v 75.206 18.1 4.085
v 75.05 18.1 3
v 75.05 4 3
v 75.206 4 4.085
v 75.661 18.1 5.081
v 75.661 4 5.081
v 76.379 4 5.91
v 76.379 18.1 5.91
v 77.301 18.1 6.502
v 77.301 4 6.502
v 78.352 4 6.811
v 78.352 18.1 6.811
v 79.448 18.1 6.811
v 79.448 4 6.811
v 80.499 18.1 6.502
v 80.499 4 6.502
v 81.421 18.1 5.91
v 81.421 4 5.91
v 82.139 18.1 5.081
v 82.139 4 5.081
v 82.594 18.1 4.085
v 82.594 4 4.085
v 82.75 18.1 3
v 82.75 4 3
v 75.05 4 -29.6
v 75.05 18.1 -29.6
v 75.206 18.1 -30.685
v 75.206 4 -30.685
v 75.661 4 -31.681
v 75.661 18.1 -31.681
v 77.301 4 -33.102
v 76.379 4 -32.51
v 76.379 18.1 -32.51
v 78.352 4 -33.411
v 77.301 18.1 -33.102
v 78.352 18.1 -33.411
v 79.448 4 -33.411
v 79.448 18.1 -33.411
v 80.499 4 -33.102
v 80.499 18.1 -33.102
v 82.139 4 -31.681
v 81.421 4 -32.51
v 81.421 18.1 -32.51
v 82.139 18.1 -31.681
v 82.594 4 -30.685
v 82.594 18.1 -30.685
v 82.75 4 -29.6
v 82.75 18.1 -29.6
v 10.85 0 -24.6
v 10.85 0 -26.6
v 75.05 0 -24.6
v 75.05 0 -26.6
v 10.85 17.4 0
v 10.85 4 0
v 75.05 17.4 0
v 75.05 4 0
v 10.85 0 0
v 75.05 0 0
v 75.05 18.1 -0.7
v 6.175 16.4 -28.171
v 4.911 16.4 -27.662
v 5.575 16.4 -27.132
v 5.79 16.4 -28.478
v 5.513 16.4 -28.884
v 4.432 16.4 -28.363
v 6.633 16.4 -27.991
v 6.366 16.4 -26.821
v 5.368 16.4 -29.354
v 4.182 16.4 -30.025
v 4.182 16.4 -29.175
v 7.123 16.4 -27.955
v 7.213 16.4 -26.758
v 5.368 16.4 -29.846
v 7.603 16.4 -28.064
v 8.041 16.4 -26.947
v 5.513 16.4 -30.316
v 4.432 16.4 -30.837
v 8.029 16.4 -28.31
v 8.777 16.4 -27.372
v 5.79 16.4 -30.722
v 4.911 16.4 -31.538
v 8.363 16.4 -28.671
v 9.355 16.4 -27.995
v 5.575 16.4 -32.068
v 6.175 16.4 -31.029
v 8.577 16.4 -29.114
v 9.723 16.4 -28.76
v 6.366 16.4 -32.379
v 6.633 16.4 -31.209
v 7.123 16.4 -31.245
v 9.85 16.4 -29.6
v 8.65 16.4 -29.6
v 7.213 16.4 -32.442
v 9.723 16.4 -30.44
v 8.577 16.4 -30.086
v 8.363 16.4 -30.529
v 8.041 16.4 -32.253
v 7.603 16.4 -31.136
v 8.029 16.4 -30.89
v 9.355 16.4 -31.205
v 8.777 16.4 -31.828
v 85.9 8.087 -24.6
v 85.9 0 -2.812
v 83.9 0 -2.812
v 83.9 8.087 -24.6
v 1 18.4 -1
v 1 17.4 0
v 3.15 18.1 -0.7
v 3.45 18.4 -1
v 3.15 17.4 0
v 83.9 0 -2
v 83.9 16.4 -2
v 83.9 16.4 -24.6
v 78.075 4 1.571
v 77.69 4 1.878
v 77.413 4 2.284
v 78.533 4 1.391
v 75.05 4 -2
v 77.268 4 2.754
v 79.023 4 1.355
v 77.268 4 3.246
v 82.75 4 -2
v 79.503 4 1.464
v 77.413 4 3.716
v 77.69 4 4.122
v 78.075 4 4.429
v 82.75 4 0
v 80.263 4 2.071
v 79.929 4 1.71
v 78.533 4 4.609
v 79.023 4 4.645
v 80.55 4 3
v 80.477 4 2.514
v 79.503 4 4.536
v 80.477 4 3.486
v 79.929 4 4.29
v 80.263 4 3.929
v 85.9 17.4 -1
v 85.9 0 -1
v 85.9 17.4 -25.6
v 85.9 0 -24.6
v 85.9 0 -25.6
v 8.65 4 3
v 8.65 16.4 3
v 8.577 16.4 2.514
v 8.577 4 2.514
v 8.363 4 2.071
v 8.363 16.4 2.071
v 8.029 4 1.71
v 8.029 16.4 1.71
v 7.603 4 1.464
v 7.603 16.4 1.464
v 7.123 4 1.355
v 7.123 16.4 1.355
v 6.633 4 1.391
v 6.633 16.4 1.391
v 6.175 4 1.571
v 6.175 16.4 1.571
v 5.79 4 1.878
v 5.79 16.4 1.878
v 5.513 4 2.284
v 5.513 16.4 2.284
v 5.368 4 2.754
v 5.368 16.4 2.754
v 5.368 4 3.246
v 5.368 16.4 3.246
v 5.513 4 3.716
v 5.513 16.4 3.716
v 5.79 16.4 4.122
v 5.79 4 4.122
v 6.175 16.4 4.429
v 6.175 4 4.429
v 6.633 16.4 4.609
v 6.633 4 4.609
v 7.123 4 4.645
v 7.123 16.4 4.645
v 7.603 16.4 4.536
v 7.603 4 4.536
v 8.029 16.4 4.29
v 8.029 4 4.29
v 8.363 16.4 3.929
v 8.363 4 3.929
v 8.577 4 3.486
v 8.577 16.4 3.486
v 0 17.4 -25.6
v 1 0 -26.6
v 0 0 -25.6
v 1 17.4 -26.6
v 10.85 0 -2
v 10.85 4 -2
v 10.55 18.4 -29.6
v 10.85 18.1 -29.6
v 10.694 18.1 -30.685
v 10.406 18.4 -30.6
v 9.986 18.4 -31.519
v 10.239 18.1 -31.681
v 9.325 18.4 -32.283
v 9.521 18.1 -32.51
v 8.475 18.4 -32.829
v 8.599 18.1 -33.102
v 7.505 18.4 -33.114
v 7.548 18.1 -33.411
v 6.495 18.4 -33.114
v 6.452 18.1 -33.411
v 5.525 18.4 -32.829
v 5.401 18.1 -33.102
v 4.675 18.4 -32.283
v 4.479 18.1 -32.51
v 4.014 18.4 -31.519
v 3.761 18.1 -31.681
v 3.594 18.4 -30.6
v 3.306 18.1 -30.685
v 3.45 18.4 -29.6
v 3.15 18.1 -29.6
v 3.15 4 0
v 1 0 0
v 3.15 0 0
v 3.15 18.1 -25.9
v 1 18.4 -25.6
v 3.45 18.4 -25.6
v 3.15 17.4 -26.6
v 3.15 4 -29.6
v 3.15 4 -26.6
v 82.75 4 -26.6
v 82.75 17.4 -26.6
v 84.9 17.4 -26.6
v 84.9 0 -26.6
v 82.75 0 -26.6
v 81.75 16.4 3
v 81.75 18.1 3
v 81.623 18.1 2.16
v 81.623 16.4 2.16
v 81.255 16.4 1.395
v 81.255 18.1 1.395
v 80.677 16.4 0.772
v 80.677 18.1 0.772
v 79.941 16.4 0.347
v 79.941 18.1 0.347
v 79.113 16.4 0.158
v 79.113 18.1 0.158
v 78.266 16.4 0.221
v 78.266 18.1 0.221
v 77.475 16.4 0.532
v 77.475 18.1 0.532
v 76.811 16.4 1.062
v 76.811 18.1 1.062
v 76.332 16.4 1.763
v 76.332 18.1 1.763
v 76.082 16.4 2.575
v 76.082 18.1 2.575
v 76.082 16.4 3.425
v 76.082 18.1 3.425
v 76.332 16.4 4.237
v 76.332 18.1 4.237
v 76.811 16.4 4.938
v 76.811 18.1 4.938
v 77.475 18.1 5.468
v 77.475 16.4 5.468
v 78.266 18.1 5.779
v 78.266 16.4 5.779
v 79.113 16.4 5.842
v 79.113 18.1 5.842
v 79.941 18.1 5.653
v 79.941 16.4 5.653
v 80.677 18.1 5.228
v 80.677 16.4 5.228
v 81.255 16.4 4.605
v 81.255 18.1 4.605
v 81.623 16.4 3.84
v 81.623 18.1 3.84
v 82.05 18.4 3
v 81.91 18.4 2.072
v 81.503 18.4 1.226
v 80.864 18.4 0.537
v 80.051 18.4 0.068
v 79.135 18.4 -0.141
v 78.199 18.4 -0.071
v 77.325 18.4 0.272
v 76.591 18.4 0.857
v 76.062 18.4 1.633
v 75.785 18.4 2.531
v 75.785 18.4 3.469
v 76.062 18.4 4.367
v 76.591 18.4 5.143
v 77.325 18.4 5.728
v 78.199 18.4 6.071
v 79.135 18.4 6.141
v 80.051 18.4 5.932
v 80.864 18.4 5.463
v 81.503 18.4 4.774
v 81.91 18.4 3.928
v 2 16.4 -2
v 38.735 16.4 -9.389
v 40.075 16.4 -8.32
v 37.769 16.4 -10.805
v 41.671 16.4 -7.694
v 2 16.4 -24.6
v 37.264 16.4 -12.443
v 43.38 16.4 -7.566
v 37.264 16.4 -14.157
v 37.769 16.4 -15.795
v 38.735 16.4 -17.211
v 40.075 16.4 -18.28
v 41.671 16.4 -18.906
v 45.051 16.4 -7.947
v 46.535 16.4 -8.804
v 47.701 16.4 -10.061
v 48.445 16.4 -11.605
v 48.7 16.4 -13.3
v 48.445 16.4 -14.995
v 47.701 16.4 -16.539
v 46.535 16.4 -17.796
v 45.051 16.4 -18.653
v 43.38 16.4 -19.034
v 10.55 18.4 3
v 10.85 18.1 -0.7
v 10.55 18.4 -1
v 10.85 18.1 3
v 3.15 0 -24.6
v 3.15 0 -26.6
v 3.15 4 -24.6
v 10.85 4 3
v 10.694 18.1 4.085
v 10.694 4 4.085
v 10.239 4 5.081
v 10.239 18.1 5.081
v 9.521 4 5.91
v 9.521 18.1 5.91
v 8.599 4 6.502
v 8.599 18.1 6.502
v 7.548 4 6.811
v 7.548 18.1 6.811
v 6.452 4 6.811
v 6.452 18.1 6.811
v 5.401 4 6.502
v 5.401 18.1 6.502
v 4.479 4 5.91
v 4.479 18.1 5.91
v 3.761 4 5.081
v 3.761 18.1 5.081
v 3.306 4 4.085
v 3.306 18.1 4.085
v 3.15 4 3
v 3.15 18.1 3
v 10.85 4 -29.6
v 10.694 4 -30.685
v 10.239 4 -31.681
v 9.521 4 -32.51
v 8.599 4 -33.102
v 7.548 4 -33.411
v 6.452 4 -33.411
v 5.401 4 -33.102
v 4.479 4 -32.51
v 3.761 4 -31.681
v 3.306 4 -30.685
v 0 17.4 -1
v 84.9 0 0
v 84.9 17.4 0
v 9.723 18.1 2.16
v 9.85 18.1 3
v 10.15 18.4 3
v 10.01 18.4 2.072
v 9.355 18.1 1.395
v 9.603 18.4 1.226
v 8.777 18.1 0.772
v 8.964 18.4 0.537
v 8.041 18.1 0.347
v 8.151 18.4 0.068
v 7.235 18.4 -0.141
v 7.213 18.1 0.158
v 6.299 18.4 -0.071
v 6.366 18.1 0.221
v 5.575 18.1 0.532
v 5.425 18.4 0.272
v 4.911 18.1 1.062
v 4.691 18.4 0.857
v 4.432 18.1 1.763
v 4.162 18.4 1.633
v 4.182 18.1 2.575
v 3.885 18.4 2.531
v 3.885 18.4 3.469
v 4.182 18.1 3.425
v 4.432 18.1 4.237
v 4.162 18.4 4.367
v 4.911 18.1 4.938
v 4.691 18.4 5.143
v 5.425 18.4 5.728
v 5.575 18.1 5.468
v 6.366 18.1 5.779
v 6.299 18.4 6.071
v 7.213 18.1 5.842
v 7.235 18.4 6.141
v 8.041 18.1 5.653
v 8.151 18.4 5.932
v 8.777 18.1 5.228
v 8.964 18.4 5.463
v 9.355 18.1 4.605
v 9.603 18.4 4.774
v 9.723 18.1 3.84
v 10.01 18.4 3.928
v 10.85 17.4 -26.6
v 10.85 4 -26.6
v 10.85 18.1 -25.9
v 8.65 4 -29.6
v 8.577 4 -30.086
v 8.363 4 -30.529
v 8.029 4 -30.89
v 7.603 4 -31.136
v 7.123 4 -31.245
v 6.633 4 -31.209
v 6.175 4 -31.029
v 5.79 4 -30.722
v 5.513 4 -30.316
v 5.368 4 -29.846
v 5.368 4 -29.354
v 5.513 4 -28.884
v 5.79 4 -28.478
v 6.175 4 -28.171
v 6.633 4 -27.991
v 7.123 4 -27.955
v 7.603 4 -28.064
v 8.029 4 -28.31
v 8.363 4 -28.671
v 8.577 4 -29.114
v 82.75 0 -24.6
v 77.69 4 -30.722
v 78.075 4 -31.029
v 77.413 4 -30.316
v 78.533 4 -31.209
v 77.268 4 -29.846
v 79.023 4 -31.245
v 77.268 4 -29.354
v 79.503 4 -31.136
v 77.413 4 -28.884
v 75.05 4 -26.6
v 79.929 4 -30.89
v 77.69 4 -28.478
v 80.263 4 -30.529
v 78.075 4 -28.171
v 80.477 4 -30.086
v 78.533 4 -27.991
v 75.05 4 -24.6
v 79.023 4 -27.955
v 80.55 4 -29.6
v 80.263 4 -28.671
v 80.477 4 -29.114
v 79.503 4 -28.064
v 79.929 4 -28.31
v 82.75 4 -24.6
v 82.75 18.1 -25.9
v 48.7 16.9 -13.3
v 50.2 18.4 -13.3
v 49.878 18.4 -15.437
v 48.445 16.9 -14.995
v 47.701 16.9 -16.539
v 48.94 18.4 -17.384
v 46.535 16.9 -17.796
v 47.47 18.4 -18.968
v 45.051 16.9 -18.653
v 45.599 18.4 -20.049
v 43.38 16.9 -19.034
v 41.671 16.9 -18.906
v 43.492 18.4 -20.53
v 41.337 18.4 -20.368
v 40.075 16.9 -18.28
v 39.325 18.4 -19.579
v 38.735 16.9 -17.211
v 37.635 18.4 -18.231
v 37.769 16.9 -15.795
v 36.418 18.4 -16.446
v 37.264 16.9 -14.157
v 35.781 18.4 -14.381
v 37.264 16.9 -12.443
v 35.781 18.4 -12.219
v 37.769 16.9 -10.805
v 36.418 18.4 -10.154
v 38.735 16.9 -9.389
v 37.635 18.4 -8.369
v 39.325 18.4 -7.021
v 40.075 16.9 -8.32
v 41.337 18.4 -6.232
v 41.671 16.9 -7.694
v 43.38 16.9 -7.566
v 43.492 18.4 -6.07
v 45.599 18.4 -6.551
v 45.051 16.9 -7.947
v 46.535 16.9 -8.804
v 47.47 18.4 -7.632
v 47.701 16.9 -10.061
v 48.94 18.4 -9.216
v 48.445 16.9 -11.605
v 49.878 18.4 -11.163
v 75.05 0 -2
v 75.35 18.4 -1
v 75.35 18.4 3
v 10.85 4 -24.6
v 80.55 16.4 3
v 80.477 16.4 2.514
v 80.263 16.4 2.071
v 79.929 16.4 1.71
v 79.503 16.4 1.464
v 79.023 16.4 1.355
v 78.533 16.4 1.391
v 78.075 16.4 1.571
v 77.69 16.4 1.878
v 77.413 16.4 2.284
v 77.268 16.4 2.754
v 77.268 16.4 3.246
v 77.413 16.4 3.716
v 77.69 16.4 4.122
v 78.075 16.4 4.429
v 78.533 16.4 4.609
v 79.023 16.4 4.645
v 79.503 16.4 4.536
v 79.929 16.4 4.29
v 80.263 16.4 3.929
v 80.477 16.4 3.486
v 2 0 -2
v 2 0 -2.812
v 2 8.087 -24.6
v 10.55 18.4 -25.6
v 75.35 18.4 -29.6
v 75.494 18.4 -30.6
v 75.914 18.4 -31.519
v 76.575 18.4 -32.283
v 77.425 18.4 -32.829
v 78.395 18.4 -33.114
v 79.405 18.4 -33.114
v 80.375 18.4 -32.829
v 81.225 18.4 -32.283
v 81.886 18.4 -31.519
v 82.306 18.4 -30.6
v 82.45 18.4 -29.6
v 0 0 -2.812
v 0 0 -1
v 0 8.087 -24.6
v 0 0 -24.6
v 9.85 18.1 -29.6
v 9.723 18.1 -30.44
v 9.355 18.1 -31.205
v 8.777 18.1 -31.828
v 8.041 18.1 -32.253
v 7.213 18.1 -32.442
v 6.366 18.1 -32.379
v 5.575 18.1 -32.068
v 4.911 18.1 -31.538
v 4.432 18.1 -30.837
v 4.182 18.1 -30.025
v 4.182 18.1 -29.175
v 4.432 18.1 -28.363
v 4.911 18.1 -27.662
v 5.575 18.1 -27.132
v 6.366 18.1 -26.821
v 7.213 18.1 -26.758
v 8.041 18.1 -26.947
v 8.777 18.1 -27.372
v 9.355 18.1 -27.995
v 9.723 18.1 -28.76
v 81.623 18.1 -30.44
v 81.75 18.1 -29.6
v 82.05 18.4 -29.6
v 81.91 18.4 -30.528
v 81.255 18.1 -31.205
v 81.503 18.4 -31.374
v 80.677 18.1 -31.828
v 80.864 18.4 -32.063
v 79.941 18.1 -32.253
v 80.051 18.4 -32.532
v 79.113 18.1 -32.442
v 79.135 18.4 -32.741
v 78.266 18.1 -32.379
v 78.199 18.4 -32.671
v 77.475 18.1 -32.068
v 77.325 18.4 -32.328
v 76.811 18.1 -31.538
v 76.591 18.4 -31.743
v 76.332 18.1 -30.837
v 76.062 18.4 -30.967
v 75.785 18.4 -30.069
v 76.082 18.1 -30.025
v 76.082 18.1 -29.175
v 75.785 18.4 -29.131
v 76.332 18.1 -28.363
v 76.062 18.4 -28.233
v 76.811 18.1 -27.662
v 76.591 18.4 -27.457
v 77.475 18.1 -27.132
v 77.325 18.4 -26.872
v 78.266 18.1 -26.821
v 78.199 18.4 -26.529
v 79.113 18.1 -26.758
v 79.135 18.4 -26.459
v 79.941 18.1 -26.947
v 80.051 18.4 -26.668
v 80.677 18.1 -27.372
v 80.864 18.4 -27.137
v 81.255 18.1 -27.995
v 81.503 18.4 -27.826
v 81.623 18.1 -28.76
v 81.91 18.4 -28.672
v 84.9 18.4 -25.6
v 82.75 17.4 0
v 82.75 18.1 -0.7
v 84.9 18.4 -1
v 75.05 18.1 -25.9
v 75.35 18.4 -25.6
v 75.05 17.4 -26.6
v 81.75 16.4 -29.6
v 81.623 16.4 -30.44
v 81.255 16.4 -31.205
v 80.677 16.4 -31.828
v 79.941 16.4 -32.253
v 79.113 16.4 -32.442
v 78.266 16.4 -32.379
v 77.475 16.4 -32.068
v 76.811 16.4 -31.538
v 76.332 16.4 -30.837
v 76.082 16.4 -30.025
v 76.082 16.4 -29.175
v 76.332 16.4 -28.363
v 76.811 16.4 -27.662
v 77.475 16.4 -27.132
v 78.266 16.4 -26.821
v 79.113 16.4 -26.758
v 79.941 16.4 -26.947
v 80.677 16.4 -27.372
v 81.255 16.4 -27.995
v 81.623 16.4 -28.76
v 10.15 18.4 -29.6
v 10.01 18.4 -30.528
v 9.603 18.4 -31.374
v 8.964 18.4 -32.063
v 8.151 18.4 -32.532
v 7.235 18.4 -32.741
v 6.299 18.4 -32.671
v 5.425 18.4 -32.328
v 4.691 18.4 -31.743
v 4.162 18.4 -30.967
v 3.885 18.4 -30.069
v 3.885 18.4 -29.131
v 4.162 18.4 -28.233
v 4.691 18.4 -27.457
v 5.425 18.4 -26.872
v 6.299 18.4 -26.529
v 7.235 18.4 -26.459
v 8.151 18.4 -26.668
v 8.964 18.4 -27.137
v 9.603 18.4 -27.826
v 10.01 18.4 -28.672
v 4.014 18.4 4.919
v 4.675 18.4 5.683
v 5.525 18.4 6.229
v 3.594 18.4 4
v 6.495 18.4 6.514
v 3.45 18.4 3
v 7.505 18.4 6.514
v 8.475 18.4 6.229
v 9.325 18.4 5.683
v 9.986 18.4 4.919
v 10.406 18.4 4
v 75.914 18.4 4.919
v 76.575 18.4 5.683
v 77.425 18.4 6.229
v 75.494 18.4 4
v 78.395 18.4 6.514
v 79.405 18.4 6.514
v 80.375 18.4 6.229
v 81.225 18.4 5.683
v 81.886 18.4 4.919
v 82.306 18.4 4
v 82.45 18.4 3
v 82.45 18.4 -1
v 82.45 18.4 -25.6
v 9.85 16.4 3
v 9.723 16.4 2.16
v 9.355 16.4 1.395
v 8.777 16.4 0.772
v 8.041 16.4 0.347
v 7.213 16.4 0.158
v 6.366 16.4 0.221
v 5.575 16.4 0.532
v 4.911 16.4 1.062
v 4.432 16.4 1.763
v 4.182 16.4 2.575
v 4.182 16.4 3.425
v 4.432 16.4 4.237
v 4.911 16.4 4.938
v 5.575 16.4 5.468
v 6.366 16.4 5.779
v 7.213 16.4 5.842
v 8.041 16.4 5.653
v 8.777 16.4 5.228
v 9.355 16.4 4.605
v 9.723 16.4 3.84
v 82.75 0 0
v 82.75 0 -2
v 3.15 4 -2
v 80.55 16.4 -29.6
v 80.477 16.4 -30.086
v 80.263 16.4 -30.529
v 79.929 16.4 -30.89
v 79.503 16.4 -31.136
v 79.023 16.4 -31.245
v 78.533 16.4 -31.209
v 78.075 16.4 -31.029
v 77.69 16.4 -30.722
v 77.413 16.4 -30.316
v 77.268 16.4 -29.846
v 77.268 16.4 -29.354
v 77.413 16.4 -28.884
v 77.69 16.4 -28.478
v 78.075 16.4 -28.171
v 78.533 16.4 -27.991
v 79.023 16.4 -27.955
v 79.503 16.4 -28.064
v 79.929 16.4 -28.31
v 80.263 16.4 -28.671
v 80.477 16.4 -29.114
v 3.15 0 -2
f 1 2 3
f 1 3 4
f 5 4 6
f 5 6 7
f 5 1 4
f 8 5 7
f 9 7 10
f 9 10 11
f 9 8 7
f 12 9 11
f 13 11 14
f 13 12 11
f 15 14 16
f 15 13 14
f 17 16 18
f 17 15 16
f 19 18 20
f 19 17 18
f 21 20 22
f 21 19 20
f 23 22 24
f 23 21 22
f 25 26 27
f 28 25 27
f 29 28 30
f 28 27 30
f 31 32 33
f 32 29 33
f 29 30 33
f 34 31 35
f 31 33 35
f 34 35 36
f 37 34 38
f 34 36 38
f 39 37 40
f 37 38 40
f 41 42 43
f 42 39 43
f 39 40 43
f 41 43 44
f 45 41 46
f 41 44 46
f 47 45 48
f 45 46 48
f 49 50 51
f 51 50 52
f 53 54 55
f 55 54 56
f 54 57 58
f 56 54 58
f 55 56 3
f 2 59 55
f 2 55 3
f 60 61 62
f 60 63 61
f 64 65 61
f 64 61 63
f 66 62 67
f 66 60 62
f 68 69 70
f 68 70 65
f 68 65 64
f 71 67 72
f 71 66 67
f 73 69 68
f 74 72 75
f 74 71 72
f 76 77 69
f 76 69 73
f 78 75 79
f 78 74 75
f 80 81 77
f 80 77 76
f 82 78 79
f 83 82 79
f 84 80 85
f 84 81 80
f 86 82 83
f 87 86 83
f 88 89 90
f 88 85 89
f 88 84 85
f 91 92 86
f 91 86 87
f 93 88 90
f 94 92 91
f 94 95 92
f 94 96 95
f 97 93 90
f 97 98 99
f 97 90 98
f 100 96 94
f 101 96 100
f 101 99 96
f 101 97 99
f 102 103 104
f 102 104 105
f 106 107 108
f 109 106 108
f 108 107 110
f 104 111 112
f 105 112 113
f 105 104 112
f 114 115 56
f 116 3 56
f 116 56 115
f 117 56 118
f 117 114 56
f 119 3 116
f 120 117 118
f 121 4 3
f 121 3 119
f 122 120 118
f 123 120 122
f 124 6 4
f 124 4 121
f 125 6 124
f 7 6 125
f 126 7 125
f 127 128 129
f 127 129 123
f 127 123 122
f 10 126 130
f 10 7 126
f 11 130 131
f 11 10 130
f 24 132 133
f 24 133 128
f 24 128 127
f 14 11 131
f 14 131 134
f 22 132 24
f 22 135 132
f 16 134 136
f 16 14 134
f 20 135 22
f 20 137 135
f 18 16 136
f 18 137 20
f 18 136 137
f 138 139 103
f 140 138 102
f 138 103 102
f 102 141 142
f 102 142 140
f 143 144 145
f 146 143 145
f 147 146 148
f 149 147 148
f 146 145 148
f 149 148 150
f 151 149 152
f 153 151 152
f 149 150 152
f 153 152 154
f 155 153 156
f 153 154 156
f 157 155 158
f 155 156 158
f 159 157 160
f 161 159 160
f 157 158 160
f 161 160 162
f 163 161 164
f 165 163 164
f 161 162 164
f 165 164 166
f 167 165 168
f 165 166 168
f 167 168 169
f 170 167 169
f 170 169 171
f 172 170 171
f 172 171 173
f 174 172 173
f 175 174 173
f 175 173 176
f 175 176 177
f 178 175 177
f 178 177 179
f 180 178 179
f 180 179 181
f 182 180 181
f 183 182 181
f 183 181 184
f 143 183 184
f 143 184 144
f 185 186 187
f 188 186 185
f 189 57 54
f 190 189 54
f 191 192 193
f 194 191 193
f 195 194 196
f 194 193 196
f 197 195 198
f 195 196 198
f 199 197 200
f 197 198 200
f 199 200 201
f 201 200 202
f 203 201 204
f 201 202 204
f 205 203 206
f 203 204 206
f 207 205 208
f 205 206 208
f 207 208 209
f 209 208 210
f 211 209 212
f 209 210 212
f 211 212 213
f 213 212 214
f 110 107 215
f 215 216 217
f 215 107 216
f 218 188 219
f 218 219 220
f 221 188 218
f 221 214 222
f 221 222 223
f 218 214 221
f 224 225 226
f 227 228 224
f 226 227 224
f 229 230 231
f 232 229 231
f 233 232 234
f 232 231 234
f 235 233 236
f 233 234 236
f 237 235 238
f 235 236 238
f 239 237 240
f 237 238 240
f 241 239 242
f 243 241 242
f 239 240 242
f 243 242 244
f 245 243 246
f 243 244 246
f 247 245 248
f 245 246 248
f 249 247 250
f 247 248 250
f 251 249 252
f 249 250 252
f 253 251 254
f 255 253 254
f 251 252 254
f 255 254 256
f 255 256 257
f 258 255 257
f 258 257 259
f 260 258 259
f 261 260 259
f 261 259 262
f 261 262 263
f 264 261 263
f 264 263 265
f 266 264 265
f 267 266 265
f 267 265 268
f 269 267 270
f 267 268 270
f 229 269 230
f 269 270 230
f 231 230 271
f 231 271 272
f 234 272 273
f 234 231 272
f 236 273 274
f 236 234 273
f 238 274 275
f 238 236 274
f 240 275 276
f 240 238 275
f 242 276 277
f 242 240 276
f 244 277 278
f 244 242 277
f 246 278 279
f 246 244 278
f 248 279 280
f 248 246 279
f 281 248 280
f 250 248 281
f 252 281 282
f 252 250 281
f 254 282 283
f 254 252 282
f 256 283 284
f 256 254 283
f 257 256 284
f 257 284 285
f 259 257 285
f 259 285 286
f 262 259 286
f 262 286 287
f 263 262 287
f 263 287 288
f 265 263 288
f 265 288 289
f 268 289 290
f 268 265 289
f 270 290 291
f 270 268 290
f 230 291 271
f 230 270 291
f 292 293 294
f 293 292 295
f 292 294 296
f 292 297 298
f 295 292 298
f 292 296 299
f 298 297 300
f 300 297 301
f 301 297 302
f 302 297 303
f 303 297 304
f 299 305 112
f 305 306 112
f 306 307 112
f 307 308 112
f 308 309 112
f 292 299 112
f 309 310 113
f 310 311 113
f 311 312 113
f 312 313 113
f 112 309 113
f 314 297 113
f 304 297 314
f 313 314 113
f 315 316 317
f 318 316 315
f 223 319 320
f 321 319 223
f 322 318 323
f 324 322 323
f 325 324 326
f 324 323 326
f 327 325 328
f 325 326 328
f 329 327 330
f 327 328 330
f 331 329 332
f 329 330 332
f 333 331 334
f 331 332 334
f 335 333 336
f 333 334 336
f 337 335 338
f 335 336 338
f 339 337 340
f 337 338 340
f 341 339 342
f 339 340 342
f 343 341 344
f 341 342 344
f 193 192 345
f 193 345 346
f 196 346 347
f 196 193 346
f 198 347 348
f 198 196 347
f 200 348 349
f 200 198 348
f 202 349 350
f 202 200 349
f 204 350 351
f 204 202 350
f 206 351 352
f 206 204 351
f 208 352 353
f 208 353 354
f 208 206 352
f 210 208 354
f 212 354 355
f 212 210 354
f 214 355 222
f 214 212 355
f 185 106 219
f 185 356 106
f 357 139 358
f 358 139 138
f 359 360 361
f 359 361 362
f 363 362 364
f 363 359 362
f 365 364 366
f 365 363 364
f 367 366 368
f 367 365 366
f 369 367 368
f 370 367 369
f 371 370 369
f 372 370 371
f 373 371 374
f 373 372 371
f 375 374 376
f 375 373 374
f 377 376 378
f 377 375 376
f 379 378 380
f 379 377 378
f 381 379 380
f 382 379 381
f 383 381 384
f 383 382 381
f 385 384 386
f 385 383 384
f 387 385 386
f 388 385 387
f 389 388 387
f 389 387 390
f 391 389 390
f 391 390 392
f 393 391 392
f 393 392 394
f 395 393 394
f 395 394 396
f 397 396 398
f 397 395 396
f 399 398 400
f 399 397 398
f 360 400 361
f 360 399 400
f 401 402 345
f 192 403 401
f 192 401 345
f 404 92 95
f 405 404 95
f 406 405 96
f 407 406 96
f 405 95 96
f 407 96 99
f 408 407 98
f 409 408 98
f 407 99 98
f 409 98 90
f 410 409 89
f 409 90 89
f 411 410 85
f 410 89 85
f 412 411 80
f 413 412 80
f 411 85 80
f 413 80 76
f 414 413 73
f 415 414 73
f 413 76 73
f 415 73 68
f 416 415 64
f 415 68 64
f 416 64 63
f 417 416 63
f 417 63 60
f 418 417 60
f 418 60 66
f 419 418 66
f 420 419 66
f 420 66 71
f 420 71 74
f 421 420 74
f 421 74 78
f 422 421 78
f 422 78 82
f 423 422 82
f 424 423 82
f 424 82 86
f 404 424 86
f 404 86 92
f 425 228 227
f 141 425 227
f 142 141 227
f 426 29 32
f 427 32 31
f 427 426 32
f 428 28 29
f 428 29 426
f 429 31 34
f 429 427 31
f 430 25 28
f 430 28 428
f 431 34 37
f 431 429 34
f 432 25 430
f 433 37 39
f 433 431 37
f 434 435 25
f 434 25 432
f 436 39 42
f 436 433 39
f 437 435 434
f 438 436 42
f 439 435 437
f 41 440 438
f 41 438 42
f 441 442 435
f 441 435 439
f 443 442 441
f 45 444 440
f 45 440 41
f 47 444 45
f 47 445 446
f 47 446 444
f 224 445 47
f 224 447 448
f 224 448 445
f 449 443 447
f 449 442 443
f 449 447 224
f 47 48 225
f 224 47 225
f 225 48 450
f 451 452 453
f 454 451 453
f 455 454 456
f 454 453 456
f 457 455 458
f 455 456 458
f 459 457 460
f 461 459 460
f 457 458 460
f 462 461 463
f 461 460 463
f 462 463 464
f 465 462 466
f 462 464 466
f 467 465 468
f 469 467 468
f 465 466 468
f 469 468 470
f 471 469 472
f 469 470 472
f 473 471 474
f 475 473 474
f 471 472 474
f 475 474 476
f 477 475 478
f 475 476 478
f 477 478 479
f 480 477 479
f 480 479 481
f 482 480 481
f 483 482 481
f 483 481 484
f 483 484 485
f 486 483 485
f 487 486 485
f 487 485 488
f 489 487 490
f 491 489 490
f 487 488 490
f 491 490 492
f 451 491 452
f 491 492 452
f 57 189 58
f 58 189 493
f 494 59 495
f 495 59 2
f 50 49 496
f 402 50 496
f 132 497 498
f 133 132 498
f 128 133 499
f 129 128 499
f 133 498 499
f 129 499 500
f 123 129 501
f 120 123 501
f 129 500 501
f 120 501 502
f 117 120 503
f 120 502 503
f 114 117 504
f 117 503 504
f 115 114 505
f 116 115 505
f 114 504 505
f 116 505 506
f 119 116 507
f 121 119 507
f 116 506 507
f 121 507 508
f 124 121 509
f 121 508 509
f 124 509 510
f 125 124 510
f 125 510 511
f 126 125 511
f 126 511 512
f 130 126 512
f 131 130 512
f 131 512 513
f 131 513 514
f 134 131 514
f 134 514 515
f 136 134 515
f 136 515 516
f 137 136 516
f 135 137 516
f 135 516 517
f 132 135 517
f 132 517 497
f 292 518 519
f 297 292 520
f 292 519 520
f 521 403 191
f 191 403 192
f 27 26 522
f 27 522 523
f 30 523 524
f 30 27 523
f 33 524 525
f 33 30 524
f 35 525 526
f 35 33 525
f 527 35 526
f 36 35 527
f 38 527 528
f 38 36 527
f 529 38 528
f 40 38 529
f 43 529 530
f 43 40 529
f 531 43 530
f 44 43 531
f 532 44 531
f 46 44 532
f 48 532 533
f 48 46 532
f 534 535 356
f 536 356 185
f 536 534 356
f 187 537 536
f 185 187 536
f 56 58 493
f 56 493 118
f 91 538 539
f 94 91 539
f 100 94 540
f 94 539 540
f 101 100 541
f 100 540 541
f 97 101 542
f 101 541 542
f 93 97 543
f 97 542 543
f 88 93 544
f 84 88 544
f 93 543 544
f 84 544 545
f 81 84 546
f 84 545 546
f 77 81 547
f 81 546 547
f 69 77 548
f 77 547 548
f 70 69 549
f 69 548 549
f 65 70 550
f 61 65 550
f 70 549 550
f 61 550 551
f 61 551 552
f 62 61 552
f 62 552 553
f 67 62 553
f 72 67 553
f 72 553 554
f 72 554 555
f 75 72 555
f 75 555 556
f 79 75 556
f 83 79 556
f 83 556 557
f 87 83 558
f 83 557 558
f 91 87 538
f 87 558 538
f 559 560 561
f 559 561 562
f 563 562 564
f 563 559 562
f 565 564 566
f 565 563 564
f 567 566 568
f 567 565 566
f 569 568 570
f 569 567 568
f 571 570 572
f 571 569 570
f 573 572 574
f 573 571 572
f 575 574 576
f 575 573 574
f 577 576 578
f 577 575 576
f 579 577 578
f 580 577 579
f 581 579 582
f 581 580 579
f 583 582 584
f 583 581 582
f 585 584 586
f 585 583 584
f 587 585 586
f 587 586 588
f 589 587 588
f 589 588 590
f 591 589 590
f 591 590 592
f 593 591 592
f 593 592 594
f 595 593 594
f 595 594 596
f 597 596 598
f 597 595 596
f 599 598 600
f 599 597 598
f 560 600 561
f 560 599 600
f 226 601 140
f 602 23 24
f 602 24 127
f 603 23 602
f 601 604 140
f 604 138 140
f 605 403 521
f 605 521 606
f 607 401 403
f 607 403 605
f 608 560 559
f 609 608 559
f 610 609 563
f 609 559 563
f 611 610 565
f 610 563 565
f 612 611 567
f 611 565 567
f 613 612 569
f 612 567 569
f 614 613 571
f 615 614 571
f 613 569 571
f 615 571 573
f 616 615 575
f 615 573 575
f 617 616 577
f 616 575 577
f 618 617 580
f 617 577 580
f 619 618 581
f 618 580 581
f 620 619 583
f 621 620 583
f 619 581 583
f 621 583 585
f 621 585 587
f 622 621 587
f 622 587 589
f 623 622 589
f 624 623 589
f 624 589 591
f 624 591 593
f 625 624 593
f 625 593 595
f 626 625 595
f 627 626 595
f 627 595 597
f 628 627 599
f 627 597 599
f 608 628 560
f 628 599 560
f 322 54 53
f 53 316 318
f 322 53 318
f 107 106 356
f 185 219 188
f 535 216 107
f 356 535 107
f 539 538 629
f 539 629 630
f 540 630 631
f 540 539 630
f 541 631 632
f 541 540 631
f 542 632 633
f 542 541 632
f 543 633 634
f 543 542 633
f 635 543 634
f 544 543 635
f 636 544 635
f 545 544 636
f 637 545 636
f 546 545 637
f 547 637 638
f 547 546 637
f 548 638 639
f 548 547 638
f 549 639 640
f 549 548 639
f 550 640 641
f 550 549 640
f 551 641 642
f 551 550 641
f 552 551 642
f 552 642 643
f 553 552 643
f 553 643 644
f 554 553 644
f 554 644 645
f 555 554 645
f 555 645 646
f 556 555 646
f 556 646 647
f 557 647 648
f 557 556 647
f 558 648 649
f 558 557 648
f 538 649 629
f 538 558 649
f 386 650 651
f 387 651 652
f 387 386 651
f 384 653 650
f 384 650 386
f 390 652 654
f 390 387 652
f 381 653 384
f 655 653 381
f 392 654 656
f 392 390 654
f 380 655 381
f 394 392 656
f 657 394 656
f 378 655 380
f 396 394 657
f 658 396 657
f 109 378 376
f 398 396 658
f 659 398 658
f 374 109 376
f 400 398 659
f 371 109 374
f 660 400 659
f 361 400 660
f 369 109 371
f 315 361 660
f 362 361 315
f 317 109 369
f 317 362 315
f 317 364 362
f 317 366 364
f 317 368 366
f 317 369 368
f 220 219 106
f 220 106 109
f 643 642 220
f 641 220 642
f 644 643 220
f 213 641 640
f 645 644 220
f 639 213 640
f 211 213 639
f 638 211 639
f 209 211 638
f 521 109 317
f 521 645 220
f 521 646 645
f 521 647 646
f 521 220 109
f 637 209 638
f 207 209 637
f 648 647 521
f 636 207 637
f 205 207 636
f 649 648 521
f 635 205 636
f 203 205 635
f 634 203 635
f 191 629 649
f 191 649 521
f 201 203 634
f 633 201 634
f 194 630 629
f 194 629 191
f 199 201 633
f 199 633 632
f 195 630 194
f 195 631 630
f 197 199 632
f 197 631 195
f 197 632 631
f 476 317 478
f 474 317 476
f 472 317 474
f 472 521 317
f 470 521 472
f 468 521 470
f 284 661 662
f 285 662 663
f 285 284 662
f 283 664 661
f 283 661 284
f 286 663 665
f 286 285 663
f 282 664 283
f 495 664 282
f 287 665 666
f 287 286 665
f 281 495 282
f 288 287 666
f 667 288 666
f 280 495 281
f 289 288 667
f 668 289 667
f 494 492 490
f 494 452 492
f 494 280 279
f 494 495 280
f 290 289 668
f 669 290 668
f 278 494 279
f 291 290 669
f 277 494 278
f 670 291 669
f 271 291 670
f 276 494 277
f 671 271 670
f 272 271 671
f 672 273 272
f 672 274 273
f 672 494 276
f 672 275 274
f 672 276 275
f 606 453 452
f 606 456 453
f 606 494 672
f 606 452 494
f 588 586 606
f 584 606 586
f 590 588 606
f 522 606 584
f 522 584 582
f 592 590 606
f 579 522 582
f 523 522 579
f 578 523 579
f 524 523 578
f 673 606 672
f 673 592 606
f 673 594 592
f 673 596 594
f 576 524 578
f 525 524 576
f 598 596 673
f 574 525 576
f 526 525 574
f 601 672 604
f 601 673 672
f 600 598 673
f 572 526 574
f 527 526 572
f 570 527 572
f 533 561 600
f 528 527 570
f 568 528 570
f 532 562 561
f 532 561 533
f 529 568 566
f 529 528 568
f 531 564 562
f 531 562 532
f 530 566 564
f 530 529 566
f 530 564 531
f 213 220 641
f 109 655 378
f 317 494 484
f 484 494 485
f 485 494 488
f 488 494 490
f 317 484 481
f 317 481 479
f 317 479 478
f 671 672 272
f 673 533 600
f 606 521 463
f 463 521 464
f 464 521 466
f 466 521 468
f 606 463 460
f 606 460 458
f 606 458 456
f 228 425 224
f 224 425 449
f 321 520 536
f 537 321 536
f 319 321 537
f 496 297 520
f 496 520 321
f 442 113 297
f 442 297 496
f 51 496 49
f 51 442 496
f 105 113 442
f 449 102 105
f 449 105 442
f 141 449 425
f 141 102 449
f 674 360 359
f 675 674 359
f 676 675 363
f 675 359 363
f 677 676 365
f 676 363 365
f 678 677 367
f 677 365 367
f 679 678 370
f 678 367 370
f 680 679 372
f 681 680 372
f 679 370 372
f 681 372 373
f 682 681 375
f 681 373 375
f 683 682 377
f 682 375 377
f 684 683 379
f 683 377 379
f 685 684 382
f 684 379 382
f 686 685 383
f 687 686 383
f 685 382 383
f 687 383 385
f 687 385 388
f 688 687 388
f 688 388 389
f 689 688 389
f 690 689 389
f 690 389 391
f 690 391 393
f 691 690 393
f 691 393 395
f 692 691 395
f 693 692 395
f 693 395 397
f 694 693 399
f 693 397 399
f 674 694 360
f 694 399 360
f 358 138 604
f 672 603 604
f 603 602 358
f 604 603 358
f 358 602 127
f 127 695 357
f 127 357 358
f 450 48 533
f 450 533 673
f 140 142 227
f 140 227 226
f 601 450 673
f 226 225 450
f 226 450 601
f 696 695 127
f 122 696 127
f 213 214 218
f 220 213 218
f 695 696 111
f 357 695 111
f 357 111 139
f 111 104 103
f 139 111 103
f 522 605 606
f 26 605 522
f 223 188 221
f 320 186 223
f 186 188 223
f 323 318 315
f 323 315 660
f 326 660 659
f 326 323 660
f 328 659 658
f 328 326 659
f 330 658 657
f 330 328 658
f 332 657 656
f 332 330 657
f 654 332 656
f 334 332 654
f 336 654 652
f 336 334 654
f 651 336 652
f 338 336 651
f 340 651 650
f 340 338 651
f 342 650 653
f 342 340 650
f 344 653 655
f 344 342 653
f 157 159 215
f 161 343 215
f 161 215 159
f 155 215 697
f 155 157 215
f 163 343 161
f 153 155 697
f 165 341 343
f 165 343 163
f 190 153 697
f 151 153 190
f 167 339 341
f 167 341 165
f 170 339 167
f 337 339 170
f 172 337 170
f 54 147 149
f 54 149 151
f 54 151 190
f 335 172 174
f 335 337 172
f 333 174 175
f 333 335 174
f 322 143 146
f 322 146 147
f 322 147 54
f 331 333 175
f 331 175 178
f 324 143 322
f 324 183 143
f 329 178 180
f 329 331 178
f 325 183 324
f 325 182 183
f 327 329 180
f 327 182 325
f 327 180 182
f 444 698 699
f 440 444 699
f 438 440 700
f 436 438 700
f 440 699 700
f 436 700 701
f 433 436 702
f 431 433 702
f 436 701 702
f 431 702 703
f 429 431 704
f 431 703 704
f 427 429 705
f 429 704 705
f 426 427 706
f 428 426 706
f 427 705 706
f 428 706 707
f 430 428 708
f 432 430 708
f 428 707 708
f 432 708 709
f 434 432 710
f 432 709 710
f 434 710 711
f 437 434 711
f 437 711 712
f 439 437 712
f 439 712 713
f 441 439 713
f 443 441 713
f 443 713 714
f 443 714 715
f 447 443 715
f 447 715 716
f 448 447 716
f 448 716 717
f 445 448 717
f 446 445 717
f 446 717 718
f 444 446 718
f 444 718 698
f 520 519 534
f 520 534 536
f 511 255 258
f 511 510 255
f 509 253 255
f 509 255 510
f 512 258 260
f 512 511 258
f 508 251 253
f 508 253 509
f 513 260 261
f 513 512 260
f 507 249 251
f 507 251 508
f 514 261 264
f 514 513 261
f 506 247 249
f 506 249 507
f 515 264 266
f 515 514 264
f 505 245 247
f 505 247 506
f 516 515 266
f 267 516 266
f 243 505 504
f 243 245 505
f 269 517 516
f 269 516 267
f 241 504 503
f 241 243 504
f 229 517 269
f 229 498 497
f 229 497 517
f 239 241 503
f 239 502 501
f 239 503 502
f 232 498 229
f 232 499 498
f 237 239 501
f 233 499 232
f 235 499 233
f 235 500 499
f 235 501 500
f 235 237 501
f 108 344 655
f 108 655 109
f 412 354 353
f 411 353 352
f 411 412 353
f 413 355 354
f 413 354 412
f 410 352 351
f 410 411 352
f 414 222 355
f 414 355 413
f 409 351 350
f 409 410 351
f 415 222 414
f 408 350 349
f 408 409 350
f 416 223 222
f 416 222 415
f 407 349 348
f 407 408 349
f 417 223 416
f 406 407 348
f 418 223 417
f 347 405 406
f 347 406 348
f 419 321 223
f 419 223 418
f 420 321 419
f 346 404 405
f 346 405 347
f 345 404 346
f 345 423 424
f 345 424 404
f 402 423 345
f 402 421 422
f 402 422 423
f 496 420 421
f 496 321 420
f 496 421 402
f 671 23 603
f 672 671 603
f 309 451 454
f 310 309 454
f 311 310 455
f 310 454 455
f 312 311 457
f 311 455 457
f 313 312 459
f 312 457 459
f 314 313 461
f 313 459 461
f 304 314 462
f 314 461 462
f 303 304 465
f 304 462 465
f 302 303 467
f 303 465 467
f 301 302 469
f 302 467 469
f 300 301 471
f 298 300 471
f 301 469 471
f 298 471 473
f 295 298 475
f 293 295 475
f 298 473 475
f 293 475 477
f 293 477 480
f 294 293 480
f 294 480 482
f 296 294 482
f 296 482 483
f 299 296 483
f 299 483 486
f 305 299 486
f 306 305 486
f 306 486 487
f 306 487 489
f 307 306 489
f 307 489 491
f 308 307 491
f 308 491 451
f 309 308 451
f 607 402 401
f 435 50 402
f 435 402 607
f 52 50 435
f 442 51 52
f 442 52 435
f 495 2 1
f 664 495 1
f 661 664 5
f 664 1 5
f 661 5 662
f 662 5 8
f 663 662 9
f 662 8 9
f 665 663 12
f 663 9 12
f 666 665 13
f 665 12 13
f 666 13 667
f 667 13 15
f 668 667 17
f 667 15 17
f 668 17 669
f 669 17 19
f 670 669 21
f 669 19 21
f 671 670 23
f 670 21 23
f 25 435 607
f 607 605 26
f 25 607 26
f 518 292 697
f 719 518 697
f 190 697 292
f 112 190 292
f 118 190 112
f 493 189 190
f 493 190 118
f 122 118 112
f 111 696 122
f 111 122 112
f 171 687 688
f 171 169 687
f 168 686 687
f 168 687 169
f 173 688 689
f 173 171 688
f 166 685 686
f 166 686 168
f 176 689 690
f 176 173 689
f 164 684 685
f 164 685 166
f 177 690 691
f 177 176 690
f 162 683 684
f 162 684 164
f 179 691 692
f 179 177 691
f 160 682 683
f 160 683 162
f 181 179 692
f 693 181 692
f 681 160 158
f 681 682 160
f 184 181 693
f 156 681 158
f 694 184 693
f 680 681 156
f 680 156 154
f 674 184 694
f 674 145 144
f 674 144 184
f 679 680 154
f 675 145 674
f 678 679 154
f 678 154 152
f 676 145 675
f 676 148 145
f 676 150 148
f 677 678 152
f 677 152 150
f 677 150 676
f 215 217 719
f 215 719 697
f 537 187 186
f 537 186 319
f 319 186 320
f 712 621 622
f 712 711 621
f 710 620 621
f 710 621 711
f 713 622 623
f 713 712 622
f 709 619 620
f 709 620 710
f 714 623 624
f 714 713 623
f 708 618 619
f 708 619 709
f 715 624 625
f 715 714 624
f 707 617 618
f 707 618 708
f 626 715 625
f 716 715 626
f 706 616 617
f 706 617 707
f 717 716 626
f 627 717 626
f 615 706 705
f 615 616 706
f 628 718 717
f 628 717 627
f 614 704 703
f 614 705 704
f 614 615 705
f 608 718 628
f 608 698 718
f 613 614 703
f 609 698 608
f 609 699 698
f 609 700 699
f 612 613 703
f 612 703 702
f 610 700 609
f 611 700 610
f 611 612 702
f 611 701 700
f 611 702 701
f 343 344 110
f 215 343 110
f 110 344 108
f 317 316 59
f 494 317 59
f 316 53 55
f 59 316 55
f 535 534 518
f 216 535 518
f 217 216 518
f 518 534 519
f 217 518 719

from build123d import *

# Parameters (mm, degrees)
SKETCH1_W           = 85.9
SKETCH1_H           = 26.6
BOSS_EXTRUDE1_DEPTH = 18.4
SHELL1_T            = -2
SKETCH2_R           = 5.75
CUT_EXTRUDE1_DEPTH  = 19.4
CUT_EXTRUDE2_DEPTH  = 86.9
CHAMFER1_SIZE       = 1.5
BOSS_EXTRUDE2_DEPTH = 18.4
SKETCH5_R           = 1.65
CUT_EXTRUDE3_DEPTH  = 19.4
SKETCH6_R           = 2.85
CUT_EXTRUDE4_DEPTH  = 2
CHAMFER2_SIZE       = 0.3
CHAMFER3_SIZE       = 1
SKETCH7_W           = 79.6
SKETCH7_H           = 6.85
CUT_EXTRUDE5_DEPTH  = 4
CHAMFER4_SIZE       = 0.3
SKETCH8_W           = 7.7
SKETCH8_H           = 4
CUT_EXTRUDE6_DEPTH  = 34.45


with BuildPart() as part:
    # Sketch1 → Boss-Extrude1 (new body)
    with BuildSketch(Plane(origin=(0, 0, 0), x_dir=(1, 0, 0), z_dir=(0, 1, 0))):
        with Locations((42.95, 13.3)):
            Rectangle(SKETCH1_W, SKETCH1_H)
    extrude(amount=BOSS_EXTRUDE1_DEPTH)

    # Shell1
    shell1_openings = [part.faces().sort_by_distance(p)[0] for p in [
        (42.95, 0, -13.3),
    ]]
    offset(amount=SHELL1_T, openings=shell1_openings, kind=Kind.INTERSECTION)

    # Sketch2 → Cut-Extrude1 (cut, through all)
    with BuildSketch(Plane(origin=(0, 18.4, 0), x_dir=(1, 0, 0), z_dir=(0, 1, 0))):
        with Locations((42.95, 13.3)):
            Circle(SKETCH2_R)
    extrude(amount=-CUT_EXTRUDE1_DEPTH, mode=Mode.SUBTRACT)

    # Sketch3 → Cut-Extrude2 (cut, through all)
    with BuildSketch(Plane(origin=(85.9, 0, 0), x_dir=(0, 0, -1), z_dir=(1, 0, 0))):
        Polygon((2.8125, 0), (24.6, 8.087162678), (24.6, 0), align=None)
    extrude(amount=-CUT_EXTRUDE2_DEPTH, mode=Mode.SUBTRACT)

    # Chamfer1
    chamfer1_edges = [part.edges().sort_by_distance(p)[0] for p in [
        (37.2, 18.4, -13.3),
    ]]
    chamfer(chamfer1_edges, length=CHAMFER1_SIZE)

    # Sketch4 → Boss-Extrude2 (add)
    with BuildSketch(Plane(origin=(0, 18.4, 0), x_dir=(1, 0, 0), z_dir=(0, 1, 0))):
        with BuildLine():
            Line((3.15, 29.6), (3.15, 26.6))
            Line((3.15, 26.6), (10.85, 26.6))
            Line((10.85, 26.6), (10.85, 29.6))
            ThreePointArc((10.85, 29.6), (7, 33.45), (3.15, 29.6))
        make_face()
        with BuildLine():
            Line((3.15, -3), (3.15, 0))
            Line((3.15, 0), (10.85, 0))
            Line((10.85, 0), (10.85, -3))
            ThreePointArc((10.85, -3), (7, -6.85), (3.15, -3))
        make_face()
        with BuildLine():
            Line((75.05, 0), (75.05, -3))
            ThreePointArc((75.05, -3), (78.9, -6.85), (82.75, -3))
            Line((82.75, -3), (82.75, 0))
            Line((82.75, 0), (75.05, 0))
        make_face()
        with BuildLine():
            Line((75.05, 26.6), (75.05, 29.6))
            ThreePointArc((75.05, 29.6), (78.9, 33.45), (82.75, 29.6))
            Line((82.75, 29.6), (82.75, 26.6))
            Line((82.75, 26.6), (75.05, 26.6))
        make_face()
    extrude(amount=-BOSS_EXTRUDE2_DEPTH)

    # Sketch5 → Cut-Extrude3 (cut, through all)
    with BuildSketch(Plane(origin=(0, 18.4, 0), x_dir=(1, 0, 0), z_dir=(0, 1, 0))):
        with Locations((7, 29.6)):
            Circle(SKETCH5_R)
        with Locations((7, -3)):
            Circle(SKETCH5_R)
        with Locations((78.9, -3)):
            Circle(SKETCH5_R)
        with Locations((78.9, 29.6)):
            Circle(SKETCH5_R)
    extrude(amount=-CUT_EXTRUDE3_DEPTH, mode=Mode.SUBTRACT)

    # Sketch6 → Cut-Extrude4 (cut)
    with BuildSketch(Plane(origin=(0, 18.4, 0), x_dir=(1, 0, 0), z_dir=(0, 1, 0))):
        with Locations((7, 29.6)):
            Circle(SKETCH6_R)
        with Locations((78.9, 29.6)):
            Circle(SKETCH6_R)
        with Locations((78.9, -3)):
            Circle(SKETCH6_R)
        with Locations((7, -3)):
            Circle(SKETCH6_R)
    extrude(amount=-CUT_EXTRUDE4_DEPTH, mode=Mode.SUBTRACT)

    # Chamfer2
    chamfer2_edges = [part.edges().sort_by_distance(p)[0] for p in [
        (4.15, 18.4, 3),
        (76.05, 18.4, 3),
        (76.05, 18.4, -29.6),
        (4.15, 18.4, -29.6),
    ]]
    chamfer(chamfer2_edges, length=CHAMFER2_SIZE)

    # Chamfer3
    chamfer3_edges = [part.edges().sort_by_distance(p)[0] for p in [
        (85.9, 18.4, -13.3),
        (84.325, 18.4, -26.6),
        (0, 18.4, -13.3),
        (1.575, 18.4, -26.6),
        (42.95, 18.4, 0),
        (1.575, 18.4, 0),
        (0, 9.2, -26.6),
        (85.9, 9.2, -26.6),
        (85.9, 9.2, 0),
        (0, 9.2, 0),
        (84.325, 18.4, 0),
        (42.95, 18.4, -26.6),
    ]]
    chamfer(chamfer3_edges, length=CHAMFER3_SIZE)

    # Sketch7 → Cut-Extrude5 (cut)
    with BuildSketch(Plane.XZ):
        with Locations((42.95, 3.425)):
            Rectangle(SKETCH7_W, SKETCH7_H)
        with Locations((42.95, -30.025)):
            Rectangle(SKETCH7_W, SKETCH7_H)
    extrude(amount=-CUT_EXTRUDE5_DEPTH, mode=Mode.SUBTRACT)

    # Chamfer4
    chamfer4_edges = [part.edges().sort_by_distance(p)[0] for p in [
        (7, 18.4, -33.45),
        (3.15, 18.4, -27.6),
        (10.85, 18.4, -27.6),
        (7, 18.4, 6.85),
        (10.85, 18.4, 1),
        (3.15, 18.4, 1),
        (78.9, 18.4, 6.85),
        (82.75, 18.4, 1),
        (75.05, 18.4, 1),
        (78.9, 18.4, -33.45),
        (75.05, 18.4, -27.6),
        (82.75, 18.4, -27.6),
    ]]
    chamfer(chamfer4_edges, length=CHAMFER4_SIZE)

    # Sketch8 → Cut-Extrude6 (cut, through all)
    with BuildSketch(Plane.XY):
        with Locations((7, 2)):
            Rectangle(SKETCH8_W, SKETCH8_H)
        with Locations((78.9, 2)):
            Rectangle(SKETCH8_W, SKETCH8_H)
    extrude(amount=-CUT_EXTRUDE6_DEPTH, mode=Mode.SUBTRACT)


solid = part.part
